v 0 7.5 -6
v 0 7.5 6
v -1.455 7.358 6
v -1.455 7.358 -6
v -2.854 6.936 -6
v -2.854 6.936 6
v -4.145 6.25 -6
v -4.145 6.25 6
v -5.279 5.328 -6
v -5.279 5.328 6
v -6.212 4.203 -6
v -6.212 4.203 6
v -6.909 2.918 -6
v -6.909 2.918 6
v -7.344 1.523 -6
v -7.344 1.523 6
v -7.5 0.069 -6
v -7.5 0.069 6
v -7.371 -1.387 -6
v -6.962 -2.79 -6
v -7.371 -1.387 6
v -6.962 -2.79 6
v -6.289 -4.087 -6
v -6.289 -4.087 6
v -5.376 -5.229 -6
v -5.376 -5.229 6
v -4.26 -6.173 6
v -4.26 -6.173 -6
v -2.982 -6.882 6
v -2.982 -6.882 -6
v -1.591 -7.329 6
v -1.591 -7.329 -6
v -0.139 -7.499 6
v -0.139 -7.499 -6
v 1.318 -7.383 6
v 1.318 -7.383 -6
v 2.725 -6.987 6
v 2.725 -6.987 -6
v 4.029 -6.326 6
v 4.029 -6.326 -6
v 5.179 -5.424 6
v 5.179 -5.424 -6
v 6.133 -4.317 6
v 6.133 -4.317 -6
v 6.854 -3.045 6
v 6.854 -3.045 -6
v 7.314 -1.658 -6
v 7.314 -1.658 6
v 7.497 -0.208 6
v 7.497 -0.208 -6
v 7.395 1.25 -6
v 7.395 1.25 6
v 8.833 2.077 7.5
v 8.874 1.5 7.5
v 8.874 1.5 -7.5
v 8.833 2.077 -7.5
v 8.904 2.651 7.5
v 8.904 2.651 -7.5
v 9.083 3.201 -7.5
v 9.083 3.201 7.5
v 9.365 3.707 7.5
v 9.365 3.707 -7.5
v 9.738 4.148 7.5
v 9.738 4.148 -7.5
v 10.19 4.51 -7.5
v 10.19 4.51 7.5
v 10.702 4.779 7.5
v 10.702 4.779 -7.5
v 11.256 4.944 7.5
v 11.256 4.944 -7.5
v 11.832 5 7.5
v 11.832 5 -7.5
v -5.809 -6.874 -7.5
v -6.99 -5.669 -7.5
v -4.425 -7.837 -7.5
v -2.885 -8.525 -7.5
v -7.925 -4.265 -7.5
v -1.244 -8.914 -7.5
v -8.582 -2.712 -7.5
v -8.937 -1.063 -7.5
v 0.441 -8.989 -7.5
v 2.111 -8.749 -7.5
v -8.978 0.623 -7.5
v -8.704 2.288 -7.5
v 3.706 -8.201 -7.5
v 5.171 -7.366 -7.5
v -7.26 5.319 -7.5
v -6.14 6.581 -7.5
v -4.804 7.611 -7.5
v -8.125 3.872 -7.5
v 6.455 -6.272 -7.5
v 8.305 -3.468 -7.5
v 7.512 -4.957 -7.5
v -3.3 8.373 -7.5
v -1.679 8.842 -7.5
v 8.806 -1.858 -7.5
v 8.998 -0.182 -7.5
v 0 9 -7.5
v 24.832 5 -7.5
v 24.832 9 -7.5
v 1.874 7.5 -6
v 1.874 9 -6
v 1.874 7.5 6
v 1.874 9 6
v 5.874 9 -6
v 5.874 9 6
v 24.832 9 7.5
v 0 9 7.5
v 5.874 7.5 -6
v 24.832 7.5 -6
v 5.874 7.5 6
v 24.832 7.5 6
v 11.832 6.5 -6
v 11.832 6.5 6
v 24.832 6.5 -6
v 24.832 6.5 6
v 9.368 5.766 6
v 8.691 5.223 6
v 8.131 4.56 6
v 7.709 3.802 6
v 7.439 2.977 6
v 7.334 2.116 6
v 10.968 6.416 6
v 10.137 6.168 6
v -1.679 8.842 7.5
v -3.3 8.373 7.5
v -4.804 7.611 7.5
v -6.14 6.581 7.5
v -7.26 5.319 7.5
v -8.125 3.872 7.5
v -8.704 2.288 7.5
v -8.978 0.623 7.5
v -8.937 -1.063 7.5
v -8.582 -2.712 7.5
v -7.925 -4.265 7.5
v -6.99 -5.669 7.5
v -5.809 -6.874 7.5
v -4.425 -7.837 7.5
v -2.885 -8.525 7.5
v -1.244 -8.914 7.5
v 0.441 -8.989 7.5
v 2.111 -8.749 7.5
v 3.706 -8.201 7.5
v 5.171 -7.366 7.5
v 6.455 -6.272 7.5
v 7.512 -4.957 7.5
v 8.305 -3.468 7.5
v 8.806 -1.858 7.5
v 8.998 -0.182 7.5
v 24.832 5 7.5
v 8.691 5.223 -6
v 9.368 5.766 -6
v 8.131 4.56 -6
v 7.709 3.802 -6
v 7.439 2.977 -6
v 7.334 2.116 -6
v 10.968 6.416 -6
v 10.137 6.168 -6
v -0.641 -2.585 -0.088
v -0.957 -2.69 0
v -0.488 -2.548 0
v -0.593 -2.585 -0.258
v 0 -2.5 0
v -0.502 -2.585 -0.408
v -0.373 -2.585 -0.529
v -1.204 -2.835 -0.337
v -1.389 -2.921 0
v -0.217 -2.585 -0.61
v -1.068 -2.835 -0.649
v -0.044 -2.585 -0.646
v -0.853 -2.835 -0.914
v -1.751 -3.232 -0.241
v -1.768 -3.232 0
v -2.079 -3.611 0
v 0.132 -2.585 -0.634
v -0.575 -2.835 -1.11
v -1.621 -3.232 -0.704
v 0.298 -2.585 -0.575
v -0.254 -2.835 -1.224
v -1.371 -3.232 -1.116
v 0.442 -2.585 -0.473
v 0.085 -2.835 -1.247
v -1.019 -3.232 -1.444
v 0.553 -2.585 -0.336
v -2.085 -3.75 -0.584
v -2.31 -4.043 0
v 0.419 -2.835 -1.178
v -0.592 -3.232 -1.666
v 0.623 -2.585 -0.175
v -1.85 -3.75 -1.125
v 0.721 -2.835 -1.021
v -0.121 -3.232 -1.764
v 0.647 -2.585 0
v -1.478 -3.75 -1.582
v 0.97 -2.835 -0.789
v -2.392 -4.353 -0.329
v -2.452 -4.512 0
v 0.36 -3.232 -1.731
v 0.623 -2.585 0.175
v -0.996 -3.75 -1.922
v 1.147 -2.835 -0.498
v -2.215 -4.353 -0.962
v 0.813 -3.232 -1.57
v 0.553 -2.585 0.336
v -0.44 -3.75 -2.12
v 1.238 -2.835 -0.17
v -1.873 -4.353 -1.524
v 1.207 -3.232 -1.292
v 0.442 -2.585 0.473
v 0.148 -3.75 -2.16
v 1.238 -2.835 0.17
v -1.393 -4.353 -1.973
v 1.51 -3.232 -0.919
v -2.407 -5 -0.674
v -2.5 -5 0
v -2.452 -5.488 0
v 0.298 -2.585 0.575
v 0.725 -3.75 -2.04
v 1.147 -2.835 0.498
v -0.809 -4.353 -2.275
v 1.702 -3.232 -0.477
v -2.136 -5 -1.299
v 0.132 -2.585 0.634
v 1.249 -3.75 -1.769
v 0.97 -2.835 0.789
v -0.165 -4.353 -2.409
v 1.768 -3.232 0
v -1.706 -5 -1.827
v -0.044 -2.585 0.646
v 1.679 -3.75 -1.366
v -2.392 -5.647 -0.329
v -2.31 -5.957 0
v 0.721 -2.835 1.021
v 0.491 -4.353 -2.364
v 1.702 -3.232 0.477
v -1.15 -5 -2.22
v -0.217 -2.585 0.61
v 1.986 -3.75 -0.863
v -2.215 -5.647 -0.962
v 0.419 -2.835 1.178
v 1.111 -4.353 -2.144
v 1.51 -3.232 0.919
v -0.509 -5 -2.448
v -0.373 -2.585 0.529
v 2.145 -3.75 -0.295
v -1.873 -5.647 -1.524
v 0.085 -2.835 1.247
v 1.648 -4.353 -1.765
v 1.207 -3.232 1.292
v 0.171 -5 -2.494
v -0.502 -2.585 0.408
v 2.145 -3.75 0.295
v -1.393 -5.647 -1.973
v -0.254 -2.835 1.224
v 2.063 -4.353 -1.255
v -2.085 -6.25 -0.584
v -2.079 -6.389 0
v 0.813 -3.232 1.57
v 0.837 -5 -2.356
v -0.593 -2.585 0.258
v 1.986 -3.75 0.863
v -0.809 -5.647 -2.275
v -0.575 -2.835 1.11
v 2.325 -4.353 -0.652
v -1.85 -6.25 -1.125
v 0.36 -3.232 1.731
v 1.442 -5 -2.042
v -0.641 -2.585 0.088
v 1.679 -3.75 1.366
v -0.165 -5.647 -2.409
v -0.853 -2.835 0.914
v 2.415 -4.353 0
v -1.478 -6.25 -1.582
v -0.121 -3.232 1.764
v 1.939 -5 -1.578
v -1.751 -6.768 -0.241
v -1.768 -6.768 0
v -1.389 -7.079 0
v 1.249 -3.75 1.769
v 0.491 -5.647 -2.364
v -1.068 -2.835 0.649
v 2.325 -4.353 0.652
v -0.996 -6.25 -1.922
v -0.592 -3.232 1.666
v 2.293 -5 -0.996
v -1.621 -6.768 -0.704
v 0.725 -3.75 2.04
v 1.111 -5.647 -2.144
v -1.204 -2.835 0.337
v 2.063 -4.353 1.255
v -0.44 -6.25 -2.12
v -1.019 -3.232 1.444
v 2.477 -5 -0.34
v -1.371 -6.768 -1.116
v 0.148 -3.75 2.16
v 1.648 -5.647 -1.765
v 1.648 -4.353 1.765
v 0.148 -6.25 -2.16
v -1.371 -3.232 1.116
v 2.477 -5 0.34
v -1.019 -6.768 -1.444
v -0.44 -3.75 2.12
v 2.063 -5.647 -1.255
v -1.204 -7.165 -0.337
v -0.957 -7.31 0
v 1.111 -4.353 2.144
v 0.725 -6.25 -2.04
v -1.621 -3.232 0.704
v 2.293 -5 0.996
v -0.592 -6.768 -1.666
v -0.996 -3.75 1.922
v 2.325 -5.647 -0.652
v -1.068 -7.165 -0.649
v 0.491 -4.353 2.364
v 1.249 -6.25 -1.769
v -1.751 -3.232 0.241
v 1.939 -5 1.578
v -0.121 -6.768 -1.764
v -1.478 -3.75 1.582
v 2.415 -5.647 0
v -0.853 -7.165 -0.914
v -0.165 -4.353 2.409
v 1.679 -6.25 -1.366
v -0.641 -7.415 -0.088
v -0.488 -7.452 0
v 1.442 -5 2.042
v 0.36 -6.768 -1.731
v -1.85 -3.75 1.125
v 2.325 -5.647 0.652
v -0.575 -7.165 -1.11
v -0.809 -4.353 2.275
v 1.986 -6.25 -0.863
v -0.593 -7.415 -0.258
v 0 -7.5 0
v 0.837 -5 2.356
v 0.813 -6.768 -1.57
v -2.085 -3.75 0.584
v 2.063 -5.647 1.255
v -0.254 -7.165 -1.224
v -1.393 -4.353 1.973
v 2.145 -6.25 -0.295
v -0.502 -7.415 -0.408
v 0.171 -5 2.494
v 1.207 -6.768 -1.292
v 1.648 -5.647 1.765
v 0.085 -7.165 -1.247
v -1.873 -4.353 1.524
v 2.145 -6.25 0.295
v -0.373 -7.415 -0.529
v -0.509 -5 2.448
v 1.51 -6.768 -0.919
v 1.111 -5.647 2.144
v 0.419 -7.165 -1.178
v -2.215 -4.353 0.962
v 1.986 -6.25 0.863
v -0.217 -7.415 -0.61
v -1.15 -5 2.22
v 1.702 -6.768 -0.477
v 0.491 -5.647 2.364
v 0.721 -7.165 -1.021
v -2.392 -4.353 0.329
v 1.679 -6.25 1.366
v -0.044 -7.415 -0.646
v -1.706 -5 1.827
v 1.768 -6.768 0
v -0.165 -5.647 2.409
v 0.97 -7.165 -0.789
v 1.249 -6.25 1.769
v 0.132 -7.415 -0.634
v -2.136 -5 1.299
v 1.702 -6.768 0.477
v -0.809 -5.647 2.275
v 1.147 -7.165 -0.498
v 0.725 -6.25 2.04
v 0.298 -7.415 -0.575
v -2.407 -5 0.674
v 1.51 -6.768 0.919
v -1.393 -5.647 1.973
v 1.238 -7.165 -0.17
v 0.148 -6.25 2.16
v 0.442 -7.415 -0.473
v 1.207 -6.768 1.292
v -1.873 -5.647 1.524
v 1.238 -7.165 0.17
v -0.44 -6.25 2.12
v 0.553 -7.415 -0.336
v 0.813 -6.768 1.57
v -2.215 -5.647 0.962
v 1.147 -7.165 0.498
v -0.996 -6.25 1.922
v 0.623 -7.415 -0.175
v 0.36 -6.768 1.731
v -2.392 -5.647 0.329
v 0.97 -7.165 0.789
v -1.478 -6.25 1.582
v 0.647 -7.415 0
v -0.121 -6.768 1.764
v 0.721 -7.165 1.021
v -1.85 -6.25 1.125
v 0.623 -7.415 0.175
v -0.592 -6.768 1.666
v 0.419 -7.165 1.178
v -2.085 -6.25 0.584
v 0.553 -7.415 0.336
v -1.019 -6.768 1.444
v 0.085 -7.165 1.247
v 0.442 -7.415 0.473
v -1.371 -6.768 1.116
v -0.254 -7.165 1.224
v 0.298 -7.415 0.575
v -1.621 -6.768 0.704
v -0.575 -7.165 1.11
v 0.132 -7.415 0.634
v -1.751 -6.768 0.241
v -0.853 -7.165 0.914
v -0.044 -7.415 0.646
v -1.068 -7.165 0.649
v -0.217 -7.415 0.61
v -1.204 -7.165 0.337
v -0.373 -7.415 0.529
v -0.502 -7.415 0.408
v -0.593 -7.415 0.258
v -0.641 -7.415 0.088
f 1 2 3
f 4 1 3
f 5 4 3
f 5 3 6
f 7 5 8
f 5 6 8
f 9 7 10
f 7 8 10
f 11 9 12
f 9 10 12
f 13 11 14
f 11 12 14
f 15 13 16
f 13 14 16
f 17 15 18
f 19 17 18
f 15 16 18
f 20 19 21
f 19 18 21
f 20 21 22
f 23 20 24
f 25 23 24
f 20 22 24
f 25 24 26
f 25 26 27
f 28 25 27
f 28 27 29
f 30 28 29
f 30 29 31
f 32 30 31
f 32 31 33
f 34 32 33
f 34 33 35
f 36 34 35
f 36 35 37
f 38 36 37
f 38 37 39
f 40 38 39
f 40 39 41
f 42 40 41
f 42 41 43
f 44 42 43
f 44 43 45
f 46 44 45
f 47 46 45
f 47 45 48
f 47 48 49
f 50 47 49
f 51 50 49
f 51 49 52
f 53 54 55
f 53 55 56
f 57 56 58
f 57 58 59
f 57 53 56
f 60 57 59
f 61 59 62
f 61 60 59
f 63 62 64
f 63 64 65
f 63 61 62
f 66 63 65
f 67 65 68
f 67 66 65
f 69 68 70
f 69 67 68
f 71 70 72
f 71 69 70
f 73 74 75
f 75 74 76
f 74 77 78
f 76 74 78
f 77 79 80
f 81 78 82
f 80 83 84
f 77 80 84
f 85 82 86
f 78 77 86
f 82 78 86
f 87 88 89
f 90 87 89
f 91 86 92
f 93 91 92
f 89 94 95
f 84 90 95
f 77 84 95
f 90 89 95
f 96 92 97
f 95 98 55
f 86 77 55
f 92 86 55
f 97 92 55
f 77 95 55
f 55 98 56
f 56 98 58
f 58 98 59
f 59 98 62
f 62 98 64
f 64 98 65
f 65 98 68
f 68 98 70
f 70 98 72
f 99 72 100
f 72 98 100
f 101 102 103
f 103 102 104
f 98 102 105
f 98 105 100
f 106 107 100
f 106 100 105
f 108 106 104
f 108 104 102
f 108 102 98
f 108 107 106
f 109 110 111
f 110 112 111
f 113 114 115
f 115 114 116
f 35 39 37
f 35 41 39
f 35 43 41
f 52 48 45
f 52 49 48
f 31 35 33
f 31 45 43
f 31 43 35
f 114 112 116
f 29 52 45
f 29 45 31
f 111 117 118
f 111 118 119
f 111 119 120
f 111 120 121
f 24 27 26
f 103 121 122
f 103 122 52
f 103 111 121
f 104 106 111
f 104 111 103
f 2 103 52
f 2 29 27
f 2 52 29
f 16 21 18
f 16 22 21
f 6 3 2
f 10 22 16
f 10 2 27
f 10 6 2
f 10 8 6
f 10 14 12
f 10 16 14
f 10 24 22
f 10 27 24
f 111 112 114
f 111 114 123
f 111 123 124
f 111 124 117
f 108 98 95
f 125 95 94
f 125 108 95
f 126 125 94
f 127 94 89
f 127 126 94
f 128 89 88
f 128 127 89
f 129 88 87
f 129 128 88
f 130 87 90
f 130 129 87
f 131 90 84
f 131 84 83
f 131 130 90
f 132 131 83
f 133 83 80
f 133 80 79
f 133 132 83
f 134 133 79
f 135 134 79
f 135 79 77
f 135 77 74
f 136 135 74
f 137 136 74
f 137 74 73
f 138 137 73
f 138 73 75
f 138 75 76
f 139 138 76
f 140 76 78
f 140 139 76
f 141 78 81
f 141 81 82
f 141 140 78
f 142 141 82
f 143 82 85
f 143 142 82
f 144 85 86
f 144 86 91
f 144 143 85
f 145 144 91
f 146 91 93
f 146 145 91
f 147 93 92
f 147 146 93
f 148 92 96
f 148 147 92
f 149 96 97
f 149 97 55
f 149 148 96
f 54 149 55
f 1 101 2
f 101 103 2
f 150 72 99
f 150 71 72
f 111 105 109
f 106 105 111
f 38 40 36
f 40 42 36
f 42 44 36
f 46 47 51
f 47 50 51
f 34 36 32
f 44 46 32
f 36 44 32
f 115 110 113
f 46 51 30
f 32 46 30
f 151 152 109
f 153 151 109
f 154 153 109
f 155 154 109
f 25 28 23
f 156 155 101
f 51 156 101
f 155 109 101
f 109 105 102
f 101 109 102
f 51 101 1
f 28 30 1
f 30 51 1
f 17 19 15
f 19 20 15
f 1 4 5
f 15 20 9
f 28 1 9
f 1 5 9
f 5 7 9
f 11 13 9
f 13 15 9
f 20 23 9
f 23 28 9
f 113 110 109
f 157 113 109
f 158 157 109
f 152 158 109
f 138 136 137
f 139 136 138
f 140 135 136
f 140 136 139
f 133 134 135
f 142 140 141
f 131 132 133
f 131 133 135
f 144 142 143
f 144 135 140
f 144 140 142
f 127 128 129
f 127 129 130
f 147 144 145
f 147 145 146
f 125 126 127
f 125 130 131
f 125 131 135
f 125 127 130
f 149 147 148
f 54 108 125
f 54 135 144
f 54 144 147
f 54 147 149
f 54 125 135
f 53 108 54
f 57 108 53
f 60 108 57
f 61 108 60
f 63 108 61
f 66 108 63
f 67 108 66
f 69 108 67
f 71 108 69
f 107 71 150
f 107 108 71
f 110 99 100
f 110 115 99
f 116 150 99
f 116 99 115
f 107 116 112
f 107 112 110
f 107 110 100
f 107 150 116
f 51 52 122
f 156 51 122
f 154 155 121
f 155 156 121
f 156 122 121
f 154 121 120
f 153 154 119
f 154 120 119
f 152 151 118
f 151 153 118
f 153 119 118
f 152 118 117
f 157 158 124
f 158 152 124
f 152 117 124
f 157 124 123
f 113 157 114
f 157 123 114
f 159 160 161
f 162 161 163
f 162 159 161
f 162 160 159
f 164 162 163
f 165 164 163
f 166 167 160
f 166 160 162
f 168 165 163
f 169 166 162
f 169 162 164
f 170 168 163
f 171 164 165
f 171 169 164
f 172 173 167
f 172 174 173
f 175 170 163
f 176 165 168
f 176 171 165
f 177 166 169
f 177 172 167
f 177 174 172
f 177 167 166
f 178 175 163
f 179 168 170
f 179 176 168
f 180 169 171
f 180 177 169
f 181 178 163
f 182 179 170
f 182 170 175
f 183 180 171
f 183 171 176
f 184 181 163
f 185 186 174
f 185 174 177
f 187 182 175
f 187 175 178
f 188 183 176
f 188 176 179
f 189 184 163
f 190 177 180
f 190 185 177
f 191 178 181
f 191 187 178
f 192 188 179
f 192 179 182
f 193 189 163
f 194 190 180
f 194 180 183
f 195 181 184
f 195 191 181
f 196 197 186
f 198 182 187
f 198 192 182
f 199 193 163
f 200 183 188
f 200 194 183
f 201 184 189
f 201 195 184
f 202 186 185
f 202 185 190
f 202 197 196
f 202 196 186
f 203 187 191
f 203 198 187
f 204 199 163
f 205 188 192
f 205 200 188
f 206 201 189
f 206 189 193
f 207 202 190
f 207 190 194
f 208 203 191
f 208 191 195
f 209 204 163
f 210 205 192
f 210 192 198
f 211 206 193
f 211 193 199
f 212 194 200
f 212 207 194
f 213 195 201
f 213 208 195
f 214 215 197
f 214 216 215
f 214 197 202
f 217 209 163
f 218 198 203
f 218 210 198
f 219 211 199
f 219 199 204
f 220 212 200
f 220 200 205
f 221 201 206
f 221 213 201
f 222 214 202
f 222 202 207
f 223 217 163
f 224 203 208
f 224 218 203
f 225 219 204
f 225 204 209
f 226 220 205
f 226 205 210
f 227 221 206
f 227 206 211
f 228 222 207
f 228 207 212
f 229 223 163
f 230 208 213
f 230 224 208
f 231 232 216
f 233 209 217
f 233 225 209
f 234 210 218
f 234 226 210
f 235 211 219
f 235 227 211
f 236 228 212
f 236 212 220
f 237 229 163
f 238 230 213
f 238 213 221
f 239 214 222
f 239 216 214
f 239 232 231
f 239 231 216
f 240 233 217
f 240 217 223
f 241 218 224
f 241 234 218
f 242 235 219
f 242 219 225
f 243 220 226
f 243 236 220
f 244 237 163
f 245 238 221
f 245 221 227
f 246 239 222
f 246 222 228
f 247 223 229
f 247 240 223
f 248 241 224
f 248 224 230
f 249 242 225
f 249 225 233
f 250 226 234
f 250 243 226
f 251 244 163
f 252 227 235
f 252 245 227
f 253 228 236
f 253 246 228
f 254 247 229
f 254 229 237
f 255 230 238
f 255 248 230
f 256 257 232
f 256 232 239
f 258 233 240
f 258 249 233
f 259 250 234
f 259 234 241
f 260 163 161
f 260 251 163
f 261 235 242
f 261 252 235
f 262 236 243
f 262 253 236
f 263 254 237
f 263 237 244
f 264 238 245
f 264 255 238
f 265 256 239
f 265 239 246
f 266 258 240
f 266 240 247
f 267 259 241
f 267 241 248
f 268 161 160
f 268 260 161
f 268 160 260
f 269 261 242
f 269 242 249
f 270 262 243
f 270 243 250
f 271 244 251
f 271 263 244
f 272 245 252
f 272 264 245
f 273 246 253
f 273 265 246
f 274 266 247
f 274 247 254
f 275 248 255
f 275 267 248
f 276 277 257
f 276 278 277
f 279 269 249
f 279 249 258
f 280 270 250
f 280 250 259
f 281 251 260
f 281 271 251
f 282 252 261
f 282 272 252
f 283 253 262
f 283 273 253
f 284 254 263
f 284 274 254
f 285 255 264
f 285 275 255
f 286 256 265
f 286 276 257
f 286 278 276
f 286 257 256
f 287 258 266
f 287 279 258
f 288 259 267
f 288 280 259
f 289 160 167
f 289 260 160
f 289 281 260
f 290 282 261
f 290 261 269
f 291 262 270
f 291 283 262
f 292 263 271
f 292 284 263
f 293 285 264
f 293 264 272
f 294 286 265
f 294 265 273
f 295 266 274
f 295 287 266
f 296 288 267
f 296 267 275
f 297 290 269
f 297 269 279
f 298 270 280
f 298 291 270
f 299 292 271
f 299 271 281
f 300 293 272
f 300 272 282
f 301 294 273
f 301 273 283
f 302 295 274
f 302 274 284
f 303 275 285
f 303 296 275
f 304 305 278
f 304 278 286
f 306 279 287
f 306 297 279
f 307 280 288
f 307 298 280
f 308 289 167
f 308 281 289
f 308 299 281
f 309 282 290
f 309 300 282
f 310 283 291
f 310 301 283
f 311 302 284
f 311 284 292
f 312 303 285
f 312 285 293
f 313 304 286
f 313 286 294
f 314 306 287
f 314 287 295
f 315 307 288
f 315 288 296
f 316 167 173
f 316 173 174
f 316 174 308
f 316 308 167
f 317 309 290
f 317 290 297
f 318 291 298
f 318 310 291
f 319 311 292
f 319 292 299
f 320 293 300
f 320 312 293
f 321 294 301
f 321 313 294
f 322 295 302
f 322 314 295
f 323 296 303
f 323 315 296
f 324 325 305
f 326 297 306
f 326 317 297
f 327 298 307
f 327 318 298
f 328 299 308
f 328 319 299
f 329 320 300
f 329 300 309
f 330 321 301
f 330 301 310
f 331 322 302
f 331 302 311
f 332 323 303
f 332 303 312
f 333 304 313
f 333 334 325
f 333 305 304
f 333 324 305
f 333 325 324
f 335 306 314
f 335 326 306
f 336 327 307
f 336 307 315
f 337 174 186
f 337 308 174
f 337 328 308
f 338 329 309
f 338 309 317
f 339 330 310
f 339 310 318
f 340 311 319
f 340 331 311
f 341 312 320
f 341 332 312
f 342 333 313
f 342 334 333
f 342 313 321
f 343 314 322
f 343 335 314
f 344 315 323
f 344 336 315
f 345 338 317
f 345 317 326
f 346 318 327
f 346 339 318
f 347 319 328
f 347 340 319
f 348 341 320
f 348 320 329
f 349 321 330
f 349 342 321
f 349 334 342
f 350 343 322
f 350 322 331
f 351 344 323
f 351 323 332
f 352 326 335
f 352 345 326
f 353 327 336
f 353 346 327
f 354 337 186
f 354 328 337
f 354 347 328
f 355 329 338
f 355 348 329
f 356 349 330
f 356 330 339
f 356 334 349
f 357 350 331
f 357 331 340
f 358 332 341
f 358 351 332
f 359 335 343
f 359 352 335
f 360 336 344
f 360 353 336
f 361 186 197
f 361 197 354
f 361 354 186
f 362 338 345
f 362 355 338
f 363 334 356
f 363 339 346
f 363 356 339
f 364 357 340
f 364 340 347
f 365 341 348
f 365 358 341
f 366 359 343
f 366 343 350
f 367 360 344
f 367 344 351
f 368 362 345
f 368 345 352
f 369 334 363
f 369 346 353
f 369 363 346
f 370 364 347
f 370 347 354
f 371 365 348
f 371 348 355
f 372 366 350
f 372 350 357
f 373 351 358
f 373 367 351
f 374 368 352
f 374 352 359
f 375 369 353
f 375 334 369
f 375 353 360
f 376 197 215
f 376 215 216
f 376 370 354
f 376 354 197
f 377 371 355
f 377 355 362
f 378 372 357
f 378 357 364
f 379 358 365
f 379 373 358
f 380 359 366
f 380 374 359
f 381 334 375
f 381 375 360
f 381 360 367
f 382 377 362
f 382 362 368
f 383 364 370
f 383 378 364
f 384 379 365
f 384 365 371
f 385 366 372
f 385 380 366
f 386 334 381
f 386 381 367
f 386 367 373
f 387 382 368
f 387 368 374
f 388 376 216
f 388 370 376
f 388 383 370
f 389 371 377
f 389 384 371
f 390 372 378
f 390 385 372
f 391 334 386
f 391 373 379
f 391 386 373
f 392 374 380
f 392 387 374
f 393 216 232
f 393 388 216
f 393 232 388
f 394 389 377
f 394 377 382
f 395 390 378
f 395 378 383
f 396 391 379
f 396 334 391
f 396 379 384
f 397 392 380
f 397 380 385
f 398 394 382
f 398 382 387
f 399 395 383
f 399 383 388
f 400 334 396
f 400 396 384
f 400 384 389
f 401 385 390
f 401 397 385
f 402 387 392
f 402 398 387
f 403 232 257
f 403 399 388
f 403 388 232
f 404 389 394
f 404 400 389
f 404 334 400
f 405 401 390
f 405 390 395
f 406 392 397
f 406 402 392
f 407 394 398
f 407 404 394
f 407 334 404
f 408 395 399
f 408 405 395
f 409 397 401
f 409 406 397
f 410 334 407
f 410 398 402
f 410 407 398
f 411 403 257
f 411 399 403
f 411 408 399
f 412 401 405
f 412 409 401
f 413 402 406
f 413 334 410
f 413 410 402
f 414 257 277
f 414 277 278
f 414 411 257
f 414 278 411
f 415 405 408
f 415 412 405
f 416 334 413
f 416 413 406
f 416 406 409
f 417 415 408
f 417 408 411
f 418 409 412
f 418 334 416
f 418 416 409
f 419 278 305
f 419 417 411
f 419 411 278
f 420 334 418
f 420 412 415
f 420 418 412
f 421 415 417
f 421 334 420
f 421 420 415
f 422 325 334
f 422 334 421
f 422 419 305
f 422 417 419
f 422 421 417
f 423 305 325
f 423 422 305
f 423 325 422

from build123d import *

# Parameters (mm, degrees)
F1_DEPTH = 7.5
F2_T     = -1.5
F3_W     = 4
F3_H     = 12
F4_DEPTH = 1.5


with BuildPart() as f1:
    # F0 (on Top) → F1 (new body, symmetric)
    with BuildSketch(Plane.XY):
        with BuildLine():
            Line((24.83216, 9), (0, 9))
            ThreePointArc((0, 9), (-5.809475, -6.873864), (8.87412, 1.5))
            ThreePointArc((8.87412, 1.5), (9.540872, 3.936492), (11.83216, 5))
            Line((11.83216, 5), (24.83216, 5))
            Line((24.83216, 5), (24.83216, 9))
        make_face()
    extrude(amount=F1_DEPTH, both=True)

    # F2
    f2_openings = [f1.faces().sort_by_distance(p)[0] for p in [
        (24.83216, 7, 0),
    ]]
    offset(amount=F2_T, openings=f2_openings)

    # F3 (on face) → F4 (cut)
    with BuildSketch(Plane(origin=(0, 9, 0), x_dir=(-1, 0, 0), z_dir=(0, 1, 0))):
        with Locations((-3.87412, 0)):
            Rectangle(F3_W, F3_H)
    extrude(amount=-F4_DEPTH, mode=Mode.SUBTRACT)


with BuildPart() as f6:
    # F5 (on Top) → F6 (revolve)
    with BuildSketch(Plane.XY):
        with BuildLine():
            Line((0, -7.5), (0, -2.5))
            ThreePointArc((0, -2.5), (-2.5, -5), (0, -7.5))
        make_face()
    revolve(axis=Axis((0, -5, 0), (0, -1, 0)))


solid = Compound([f1.part, f6.part])
